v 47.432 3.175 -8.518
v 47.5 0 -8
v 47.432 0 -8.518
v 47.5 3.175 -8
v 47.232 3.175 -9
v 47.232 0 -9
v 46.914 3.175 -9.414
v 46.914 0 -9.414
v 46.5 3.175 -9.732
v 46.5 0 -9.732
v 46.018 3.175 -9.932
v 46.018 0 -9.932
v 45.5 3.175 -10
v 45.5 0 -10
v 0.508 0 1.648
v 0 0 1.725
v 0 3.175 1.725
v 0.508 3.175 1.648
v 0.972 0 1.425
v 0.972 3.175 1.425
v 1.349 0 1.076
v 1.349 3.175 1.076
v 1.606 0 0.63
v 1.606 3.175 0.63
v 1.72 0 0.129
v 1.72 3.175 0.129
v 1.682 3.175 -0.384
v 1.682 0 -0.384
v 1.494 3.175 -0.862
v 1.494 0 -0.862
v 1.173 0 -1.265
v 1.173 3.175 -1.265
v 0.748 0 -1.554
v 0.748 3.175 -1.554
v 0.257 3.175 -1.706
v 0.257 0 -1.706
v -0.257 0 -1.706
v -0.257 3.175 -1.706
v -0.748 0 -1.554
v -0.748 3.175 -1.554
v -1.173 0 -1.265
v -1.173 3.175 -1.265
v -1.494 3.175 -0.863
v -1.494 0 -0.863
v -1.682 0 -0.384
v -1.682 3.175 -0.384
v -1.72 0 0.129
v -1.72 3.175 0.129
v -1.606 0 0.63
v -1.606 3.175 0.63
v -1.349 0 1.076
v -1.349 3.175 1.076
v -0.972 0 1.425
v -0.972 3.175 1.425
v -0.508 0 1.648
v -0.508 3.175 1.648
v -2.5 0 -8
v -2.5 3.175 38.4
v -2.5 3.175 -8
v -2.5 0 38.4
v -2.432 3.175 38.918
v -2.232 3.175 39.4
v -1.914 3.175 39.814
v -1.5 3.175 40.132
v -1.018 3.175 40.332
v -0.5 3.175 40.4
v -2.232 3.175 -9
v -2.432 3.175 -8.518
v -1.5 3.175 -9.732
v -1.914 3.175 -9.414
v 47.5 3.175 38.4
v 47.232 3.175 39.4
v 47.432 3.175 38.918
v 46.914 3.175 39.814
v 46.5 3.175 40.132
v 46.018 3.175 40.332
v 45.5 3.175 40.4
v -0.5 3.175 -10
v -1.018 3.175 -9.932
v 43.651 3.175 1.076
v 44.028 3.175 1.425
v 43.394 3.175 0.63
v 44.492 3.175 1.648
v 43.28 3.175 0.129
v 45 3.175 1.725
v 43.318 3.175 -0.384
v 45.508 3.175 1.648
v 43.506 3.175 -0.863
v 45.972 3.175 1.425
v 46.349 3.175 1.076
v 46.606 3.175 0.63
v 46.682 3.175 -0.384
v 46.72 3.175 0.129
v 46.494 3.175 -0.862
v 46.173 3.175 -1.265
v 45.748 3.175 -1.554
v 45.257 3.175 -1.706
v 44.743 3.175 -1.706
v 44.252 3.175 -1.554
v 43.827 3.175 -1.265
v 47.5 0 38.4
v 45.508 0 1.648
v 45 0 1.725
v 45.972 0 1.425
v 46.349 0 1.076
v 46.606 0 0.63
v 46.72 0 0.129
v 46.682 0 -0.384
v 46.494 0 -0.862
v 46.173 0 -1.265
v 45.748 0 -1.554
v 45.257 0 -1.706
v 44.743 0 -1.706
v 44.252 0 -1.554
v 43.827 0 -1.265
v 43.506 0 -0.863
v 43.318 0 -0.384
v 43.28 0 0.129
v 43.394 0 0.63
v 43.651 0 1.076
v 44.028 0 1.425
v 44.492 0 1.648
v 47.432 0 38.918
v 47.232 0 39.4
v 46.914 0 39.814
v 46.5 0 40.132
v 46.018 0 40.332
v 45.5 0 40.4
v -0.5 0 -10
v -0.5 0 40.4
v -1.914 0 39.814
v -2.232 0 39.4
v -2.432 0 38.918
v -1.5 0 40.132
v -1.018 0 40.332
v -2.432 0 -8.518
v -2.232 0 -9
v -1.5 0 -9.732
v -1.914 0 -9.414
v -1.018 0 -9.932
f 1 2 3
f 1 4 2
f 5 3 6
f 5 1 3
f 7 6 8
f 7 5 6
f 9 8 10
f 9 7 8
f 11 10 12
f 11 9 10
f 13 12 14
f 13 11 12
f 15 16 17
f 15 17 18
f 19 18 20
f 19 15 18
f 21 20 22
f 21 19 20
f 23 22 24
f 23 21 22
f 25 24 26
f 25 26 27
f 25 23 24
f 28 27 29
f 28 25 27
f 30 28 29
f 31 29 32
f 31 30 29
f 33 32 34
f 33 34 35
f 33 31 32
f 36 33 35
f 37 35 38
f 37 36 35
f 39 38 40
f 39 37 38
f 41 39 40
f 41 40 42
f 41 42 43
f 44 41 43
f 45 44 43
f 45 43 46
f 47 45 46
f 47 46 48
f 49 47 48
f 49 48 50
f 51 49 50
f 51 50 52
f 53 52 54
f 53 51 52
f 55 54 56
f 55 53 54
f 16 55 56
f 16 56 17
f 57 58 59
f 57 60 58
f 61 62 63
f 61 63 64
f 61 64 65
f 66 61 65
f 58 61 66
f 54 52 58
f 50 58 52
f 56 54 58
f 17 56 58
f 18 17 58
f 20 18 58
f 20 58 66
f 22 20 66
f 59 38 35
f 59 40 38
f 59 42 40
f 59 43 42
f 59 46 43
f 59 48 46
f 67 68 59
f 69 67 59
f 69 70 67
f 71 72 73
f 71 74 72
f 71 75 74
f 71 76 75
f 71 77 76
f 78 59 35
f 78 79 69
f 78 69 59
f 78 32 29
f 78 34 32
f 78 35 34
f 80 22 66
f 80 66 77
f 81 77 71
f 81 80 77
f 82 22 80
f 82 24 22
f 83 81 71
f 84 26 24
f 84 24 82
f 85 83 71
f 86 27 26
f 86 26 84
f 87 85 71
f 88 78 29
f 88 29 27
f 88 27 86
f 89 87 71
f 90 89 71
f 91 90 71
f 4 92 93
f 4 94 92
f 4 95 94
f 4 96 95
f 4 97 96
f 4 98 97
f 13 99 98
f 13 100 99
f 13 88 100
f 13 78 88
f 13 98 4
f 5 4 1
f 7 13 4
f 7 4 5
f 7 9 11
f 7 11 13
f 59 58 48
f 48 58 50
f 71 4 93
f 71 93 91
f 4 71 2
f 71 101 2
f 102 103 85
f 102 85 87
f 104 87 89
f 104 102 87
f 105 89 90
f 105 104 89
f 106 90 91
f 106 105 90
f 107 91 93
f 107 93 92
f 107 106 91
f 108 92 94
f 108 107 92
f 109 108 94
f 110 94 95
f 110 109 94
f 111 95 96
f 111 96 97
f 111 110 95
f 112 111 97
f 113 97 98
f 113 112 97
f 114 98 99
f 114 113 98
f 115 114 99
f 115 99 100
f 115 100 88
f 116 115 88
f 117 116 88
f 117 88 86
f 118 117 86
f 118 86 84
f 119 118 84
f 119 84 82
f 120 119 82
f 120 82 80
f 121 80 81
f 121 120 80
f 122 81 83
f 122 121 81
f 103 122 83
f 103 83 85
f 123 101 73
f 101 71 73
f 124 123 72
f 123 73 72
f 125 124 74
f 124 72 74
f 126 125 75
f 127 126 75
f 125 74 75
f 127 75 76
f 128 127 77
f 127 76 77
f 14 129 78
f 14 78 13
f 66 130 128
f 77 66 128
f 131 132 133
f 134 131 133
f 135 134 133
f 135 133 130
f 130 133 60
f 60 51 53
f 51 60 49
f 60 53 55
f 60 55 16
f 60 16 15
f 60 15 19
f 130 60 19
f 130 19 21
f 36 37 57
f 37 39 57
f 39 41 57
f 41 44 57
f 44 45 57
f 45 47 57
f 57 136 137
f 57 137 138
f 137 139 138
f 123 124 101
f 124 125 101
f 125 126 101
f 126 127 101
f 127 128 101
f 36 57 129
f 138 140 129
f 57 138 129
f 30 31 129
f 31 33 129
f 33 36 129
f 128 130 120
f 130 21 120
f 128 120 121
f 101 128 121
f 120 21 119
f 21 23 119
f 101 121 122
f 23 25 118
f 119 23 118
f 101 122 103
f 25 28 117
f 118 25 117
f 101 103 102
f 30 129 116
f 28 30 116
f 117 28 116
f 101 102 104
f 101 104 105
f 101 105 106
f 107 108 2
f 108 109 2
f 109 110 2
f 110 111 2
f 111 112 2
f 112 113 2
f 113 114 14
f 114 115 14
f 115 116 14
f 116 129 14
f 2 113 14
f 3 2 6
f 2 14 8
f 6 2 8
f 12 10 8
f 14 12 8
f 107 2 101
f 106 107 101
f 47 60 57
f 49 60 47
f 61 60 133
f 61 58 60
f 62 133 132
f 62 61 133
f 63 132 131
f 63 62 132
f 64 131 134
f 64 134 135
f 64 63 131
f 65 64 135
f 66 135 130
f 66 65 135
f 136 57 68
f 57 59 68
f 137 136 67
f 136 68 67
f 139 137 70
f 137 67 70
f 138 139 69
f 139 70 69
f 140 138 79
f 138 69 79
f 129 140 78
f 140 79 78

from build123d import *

# Parameters (mm, degrees)
SKETCH1_W           = 50
SKETCH1_H           = 25.4
SKETCH1_R           = 1.725
SKETCH1_H_2         = 25
BOSS_EXTRUDE1_DEPTH = 3.175
FILLET1_R           = 2


with BuildPart() as part:
    # Sketch1 → Boss-Extrude1 (new body)
    # profile 1 of 2: a face of its own
    with BuildSketch(Plane(origin=(0, 0, 0), x_dir=(1, 0, 0), z_dir=(0, 1, 0))):
        with Locations((22.5, -2.7)):
            Rectangle(SKETCH1_W, SKETCH1_H)
        with Locations(Location((0, 0, 0), (0, 0, 270))):
            Circle(SKETCH1_R, mode=Mode.SUBTRACT)
        with Locations(Location((45, 0, 0), (0, 0, 270))):
            Circle(SKETCH1_R, mode=Mode.SUBTRACT)
    # profile 2 of 2: a face of its own
    with BuildSketch(Plane(origin=(0, 0, 0), x_dir=(1, 0, 0), z_dir=(0, 1, 0))):
        with Locations((22.5, -27.9)):
            Rectangle(SKETCH1_W, SKETCH1_H_2)
    extrude(amount=BOSS_EXTRUDE1_DEPTH)

    # Fillet1
    fillet1_edges = [part.edges().sort_by_distance(p)[0] for p in [
        (47.5, 1.5875, 40.4),
        (-2.5, 1.5875, 40.4),
        (-2.5, 1.5875, -10),
        (47.5, 1.5875, -10),
    ]]
    fillet(fillet1_edges, radius=FILLET1_R)


solid = part.part
